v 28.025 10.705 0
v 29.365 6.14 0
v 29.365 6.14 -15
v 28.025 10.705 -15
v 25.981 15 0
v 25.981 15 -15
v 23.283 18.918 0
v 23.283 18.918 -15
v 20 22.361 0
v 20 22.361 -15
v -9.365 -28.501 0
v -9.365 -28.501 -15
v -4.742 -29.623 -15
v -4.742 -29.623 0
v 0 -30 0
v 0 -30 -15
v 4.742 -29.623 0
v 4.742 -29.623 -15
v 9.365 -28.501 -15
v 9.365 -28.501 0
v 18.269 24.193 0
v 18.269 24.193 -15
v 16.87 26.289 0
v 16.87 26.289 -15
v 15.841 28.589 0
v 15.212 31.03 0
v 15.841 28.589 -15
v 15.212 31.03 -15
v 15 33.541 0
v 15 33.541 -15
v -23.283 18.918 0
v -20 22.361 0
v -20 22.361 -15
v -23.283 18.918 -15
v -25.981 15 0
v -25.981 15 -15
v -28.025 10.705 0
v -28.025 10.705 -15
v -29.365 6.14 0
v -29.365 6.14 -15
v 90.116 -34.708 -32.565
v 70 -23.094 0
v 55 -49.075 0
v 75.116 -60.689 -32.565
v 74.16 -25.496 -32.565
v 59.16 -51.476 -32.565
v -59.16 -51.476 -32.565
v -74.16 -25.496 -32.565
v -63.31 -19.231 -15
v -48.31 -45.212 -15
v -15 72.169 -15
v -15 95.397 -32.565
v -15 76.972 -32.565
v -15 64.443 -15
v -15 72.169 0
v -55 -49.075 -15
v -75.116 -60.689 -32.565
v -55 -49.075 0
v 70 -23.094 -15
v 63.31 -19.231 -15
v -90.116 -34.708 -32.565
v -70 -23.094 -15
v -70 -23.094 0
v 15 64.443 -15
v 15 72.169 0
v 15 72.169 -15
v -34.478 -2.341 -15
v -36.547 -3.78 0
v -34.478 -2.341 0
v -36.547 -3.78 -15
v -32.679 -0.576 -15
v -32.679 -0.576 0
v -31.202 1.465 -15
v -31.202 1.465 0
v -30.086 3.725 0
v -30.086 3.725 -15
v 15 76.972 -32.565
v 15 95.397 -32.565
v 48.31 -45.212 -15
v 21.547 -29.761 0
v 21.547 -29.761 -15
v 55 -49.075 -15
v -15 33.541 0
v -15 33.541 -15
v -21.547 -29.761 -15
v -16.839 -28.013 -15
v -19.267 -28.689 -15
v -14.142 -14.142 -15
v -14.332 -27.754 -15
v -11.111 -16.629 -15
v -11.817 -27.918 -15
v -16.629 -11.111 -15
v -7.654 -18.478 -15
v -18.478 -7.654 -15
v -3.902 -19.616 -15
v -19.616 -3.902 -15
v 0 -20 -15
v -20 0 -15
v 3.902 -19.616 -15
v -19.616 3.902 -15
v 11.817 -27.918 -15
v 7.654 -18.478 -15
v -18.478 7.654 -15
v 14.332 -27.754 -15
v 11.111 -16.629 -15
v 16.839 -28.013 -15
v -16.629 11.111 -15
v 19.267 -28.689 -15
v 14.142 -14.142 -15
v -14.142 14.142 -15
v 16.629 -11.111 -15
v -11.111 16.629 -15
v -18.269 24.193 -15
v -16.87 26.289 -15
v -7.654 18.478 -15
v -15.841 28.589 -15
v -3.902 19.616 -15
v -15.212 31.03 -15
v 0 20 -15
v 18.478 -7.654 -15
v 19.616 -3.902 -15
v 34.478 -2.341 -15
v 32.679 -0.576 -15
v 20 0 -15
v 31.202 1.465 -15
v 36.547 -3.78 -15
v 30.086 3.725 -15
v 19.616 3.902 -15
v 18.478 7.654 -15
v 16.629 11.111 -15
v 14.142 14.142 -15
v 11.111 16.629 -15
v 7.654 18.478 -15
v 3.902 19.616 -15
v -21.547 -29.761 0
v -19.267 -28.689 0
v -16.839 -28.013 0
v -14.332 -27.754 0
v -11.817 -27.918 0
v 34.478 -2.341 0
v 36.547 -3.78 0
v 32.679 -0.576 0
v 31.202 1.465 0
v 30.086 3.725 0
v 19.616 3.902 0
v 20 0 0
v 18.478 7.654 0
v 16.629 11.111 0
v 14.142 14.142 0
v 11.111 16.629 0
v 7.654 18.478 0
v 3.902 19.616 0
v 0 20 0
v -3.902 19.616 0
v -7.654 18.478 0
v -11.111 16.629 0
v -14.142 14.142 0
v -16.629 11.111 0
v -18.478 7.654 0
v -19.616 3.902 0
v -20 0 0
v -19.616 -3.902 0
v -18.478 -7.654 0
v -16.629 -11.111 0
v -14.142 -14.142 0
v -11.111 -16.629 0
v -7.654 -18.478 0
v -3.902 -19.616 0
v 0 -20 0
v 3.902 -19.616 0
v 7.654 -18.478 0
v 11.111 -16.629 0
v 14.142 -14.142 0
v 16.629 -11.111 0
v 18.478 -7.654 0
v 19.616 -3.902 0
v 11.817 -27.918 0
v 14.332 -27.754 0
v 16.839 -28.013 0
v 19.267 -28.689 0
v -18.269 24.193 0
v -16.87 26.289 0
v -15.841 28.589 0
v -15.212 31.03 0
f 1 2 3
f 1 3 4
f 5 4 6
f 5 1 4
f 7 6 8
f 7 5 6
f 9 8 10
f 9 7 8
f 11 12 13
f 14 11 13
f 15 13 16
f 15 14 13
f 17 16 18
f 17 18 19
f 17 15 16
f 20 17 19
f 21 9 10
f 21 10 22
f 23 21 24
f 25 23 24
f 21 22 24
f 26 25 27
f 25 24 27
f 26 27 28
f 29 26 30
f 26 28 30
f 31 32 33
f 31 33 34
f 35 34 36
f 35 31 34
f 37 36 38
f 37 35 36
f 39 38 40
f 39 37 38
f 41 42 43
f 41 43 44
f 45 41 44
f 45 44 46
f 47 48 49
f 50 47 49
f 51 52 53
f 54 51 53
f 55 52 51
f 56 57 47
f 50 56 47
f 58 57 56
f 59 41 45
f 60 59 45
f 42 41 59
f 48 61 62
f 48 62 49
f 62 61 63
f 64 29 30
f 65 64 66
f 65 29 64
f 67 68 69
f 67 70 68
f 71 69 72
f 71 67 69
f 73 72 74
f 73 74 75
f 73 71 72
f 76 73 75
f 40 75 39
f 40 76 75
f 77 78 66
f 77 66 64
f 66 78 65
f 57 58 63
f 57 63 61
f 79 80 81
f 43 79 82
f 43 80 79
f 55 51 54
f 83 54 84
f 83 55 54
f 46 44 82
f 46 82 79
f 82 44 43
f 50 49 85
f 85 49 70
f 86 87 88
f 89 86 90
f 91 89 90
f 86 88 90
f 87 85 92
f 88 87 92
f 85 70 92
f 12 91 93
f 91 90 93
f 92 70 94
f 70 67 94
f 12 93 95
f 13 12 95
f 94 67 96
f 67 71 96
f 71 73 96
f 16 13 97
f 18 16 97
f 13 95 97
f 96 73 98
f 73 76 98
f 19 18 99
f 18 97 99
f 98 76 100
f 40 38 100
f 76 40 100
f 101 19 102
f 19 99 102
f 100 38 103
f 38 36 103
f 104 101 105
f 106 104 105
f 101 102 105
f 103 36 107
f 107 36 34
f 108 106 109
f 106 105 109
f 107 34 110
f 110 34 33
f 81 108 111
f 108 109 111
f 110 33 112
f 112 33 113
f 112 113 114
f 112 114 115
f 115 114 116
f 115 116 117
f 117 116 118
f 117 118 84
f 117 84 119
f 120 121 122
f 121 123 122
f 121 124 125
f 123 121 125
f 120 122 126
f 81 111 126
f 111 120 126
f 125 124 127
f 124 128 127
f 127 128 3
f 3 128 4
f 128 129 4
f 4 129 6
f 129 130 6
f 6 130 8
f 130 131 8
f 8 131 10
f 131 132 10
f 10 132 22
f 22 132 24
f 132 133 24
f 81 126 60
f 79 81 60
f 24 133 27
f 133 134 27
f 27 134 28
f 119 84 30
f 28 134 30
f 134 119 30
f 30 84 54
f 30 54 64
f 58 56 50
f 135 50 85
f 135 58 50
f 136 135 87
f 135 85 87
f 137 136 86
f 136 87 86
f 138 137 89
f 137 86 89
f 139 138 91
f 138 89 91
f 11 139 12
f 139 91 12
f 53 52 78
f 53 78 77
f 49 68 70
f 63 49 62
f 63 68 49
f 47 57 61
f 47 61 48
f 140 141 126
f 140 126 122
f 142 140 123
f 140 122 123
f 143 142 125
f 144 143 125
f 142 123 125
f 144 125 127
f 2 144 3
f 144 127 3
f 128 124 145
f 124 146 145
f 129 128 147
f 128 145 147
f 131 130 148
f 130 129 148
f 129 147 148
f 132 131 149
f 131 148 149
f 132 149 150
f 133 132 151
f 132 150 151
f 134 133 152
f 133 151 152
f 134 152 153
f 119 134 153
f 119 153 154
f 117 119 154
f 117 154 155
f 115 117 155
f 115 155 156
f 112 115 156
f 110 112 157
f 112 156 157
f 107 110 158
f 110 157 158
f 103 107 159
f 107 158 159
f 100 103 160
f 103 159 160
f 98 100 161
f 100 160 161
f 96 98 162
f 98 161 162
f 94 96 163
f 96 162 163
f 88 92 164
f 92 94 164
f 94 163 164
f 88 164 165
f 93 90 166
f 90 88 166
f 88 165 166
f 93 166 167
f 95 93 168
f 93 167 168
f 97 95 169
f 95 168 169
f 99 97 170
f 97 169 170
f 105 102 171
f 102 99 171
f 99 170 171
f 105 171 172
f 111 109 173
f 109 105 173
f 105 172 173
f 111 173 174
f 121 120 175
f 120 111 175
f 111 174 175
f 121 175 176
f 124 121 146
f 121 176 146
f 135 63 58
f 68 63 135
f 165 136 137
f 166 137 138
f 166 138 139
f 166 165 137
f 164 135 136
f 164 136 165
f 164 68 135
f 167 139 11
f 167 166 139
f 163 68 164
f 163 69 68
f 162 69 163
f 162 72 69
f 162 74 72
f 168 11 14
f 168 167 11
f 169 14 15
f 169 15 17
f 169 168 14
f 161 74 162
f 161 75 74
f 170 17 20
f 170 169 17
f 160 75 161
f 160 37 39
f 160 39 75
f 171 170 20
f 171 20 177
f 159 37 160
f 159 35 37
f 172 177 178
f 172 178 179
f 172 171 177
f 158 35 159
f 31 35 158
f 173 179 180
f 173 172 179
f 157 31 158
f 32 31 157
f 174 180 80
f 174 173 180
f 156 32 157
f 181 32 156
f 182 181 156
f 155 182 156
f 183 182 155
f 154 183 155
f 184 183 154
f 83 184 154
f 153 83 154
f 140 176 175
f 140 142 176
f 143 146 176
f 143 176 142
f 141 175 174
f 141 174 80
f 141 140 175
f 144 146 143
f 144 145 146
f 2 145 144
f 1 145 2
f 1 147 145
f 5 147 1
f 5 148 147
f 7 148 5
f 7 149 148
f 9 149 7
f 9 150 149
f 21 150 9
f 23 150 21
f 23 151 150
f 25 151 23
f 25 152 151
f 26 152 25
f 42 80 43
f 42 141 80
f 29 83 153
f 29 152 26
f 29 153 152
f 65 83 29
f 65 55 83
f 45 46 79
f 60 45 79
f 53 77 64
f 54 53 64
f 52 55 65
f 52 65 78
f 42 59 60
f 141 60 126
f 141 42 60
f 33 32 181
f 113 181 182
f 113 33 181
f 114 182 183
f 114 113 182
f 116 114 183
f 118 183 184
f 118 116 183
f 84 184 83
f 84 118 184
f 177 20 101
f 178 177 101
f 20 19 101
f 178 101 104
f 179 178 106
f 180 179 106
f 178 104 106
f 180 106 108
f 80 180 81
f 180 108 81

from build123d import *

# Parameters (mm, degrees)
F0_R     = 20
F1_DEPTH = 15
F2_R     = 15
F4_DEPTH = 30
F6_COUNT = 3


with BuildPart() as f1:
    # F0 (on Top) → F1 (new body)
    with BuildSketch(Plane.XY):
        with BuildLine():
            Line((-55, -49.0747728811), (-15, -25.9807621135))
            ThreePointArc((-15, -25.9807621135), (0, -30), (15, -25.9807621135))
            Line((15, -25.9807621135), (55, -49.0747728811))
            Line((55, -49.0747728811), (70, -23.0940107676))
            Line((70, -23.0940107676), (30, 0))
            ThreePointArc((30, 0), (25.9807621135, 15), (15, 25.9807621135))
            Line((15, 25.9807621135), (15, 72.1687836487))
            Line((15, 72.1687836487), (-15, 72.1687836487))
            Line((-15, 72.1687836487), (-15, 25.9807621135))
            ThreePointArc((-15, 25.9807621135), (-25.9807621135, 15), (-30, 0))
            Line((-30, 0), (-70, -23.0940107676))
            Line((-70, -23.0940107676), (-55, -49.0747728811))
        make_face()
        Circle(F0_R, mode=Mode.SUBTRACT)
    extrude(amount=-F1_DEPTH)

    # F2
    f2_edges = [f1.edges().sort_by_distance(p)[0] for p in [
        (-15, 25.980762, -7.5),
        (-30, 0, -7.5),
        (-15, -25.980762, -7.5),
        (15, -25.980762, -7.5),
        (15, 25.980762, -7.5),
        (30, 0, -7.5),
    ]]
    fillet(f2_edges, radius=F2_R)

    # F3 (on face) → F4 (join, through all)
    with BuildSketch(Plane(origin=(7.5, -12.9903810568, 0), x_dir=(0.8660254038, 0.5, 0), z_dir=(0.5, -0.8660254038, 0))):
        Polygon((-72.1687836487, -15), (-72.1687836487, 0), (-95.3969018771, -32.5646207343), (-76.9719982096, -32.5646207343), (-64.4432759996, -15), align=None)
    extrude(amount=-F4_DEPTH)

    # F6: F1 ×3 about axis
    f6_axis = Axis((0, 0, 0.5822554231), (0, 0, -1))


with BuildPart() as f1_1:
    add(f1.part)
    for i in range(1, F6_COUNT):
        add(f1.part.rotate(f6_axis, i * 360 / F6_COUNT))


solid = f1_1.part
